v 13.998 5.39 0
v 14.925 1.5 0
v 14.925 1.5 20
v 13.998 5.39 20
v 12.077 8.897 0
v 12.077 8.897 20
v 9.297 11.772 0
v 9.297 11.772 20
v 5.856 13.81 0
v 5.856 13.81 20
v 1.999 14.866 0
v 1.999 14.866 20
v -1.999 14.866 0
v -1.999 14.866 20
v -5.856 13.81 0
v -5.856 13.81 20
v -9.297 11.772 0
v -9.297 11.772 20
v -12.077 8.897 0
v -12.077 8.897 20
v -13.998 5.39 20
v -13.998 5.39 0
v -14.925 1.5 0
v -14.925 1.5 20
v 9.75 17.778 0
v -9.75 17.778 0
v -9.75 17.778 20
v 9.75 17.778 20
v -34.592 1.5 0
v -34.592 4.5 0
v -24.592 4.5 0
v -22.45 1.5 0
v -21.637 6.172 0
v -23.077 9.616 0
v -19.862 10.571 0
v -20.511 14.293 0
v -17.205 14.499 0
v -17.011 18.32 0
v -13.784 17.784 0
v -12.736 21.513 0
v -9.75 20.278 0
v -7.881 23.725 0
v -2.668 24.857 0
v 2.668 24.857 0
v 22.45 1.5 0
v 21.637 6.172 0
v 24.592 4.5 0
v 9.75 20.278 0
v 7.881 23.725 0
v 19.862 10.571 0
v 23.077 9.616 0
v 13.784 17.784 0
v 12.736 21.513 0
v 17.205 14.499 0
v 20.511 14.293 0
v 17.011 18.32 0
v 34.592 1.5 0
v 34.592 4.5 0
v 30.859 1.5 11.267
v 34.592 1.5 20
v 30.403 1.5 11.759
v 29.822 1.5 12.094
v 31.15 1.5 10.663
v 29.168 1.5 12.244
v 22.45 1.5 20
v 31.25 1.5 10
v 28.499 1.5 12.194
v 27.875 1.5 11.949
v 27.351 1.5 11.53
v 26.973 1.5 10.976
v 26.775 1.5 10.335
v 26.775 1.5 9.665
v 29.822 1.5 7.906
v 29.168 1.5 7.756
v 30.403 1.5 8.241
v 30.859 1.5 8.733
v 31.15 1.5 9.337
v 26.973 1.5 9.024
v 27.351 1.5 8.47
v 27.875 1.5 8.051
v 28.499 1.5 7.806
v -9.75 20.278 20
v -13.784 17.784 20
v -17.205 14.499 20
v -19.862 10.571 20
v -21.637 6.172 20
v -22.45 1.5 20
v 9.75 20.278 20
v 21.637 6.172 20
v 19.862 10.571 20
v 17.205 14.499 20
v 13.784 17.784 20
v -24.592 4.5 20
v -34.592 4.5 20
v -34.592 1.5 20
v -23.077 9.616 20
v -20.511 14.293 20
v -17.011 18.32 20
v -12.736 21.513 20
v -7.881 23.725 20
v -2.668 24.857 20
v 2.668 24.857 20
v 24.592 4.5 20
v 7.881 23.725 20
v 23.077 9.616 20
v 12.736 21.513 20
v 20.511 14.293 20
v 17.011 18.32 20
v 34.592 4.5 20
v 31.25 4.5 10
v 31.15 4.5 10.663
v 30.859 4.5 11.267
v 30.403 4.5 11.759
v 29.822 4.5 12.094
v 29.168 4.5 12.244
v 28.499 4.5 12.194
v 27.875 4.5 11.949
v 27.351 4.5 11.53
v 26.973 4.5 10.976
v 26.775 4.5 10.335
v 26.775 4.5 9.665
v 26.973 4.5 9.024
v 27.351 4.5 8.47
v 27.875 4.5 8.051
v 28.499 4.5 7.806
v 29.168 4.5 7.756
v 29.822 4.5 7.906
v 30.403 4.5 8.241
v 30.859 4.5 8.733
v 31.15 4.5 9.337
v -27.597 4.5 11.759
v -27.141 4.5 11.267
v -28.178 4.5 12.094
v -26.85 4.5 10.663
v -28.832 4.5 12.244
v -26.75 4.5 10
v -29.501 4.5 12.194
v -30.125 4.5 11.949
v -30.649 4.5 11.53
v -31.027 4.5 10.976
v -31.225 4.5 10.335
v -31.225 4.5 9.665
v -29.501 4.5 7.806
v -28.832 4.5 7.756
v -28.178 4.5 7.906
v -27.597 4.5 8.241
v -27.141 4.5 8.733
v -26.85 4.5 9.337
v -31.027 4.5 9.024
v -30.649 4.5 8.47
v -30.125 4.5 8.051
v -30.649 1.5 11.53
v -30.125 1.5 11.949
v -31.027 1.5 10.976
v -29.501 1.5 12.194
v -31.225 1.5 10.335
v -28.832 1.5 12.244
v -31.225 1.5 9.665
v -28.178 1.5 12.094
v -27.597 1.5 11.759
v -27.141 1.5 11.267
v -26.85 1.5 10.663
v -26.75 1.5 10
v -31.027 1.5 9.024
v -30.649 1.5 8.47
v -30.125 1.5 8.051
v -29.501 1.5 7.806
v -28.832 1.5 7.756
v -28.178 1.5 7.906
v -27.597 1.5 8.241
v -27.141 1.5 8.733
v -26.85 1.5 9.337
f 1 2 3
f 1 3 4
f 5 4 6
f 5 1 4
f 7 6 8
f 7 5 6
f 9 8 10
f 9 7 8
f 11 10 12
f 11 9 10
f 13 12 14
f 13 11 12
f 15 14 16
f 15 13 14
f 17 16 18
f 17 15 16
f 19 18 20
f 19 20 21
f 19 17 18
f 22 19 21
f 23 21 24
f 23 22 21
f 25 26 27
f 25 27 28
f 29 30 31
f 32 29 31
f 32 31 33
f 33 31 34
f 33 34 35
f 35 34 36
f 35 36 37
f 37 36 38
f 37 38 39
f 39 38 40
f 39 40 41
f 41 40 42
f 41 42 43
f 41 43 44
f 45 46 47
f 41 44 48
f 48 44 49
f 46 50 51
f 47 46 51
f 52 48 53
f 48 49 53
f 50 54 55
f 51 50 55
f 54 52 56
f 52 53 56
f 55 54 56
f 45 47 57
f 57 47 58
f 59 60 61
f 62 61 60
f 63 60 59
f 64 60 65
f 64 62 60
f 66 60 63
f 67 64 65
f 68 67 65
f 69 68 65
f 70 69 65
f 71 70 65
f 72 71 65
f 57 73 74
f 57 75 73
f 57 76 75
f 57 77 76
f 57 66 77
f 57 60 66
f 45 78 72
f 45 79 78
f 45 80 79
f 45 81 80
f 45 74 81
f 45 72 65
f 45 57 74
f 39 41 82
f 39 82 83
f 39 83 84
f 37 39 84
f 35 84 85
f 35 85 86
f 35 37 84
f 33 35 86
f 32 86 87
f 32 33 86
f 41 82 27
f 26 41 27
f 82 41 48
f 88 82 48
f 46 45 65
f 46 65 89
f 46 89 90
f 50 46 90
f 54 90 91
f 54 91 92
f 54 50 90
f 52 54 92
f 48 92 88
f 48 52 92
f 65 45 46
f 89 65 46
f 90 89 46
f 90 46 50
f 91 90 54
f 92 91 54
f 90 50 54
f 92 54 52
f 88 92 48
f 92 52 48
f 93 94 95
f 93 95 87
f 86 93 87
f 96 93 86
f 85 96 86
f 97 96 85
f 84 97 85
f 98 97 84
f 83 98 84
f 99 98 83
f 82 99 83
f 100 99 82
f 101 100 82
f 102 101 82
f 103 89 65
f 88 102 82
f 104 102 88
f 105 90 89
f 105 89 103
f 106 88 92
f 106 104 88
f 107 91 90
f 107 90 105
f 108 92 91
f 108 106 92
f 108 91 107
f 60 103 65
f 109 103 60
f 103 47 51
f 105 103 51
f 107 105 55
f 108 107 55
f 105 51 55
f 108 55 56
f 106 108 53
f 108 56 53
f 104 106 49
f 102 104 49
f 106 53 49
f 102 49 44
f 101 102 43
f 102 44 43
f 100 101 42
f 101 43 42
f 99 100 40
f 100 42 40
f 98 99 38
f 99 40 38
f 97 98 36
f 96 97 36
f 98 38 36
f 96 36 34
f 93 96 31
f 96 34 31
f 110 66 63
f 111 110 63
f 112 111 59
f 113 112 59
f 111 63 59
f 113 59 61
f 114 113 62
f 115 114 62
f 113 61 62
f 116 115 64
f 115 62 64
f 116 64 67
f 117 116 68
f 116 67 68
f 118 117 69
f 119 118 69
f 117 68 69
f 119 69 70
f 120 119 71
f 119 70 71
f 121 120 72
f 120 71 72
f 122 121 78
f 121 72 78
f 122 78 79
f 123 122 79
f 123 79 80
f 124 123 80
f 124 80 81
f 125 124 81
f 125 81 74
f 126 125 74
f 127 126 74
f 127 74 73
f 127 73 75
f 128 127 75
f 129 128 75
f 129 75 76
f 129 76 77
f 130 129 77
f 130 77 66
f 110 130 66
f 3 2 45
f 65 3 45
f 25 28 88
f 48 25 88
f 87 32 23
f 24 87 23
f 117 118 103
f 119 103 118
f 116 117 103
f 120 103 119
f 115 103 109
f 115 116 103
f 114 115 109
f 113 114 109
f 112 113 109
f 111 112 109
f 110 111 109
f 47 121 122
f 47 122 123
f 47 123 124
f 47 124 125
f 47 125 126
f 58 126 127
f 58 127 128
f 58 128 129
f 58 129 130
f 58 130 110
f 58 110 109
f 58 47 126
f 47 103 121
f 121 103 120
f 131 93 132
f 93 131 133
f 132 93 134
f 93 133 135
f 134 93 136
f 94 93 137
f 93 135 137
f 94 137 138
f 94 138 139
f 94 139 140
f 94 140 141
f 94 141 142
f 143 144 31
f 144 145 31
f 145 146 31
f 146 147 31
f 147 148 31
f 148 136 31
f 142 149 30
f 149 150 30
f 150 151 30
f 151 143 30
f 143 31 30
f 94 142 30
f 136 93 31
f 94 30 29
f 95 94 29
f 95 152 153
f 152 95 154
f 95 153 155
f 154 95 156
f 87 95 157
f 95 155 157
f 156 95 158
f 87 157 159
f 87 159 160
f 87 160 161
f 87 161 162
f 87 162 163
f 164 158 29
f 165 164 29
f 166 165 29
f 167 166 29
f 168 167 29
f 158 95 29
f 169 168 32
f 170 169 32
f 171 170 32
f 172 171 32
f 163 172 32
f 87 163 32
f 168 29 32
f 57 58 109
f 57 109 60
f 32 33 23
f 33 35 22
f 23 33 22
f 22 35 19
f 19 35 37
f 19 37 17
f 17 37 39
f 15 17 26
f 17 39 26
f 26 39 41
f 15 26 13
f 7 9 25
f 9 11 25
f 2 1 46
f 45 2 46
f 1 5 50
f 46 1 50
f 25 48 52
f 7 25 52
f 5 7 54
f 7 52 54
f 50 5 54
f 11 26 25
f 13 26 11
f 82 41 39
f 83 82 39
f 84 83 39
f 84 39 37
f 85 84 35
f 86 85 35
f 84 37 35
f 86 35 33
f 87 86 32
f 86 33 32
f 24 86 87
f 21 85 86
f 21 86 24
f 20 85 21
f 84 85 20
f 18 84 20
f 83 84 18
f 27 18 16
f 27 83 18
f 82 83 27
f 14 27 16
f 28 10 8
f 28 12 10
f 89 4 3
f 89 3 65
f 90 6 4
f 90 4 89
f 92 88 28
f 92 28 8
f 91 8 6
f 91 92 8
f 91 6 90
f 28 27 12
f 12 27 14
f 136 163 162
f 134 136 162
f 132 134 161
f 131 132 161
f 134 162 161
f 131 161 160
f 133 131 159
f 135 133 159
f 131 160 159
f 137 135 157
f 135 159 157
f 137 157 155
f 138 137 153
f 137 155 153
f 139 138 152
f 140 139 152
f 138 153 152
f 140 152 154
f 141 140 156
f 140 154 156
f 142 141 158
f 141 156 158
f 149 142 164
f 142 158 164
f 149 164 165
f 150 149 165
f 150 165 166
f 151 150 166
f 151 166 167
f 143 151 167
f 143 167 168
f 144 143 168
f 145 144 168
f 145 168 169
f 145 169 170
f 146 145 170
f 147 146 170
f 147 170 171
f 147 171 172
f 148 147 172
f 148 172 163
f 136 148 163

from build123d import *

# Parameters (mm, degrees)
PAD_DEPTH    = 20
PAD001_DEPTH = 20
SKETCH002_R  = 2.25
POCKET_DEPTH = 25.001


with BuildPart() as body:
    # Sketch → Pad (new body)
    with BuildSketch(Plane.XY):
        with BuildLine():
            ThreePointArc((-9.75, 20.277759), (-18.637601, 12.605151), (-22.449944, 1.5))
            Line((-22.449944, 1.5), (-14.924812, 1.5))
            ThreePointArc((14.924812, 1.5), (0, 15), (-14.924812, 1.5))
            Line((14.924812, 1.5), (22.449944, 1.5))
            ThreePointArc((22.449944, 1.5), (18.637601, 12.605151), (9.75, 20.277759))
            Line((9.75, 17.777759), (9.75, 20.277759))
            Line((-9.75, 17.777759), (9.75, 17.777759))
            Line((-9.75, 20.277759), (-9.75, 17.777759))
        make_face()
    extrude(amount=PAD_DEPTH)


with BuildPart() as body001:
    # Sketch001 → Pad001 (new body)
    with BuildSketch(Plane.XY):
        with BuildLine():
            ThreePointArc((24.591665, 4.5), (0, 25), (-24.591665, 4.5))
            Line((-24.591665, 4.5), (-34.591665, 4.5))
            Line((-34.591665, 4.5), (-34.591665, 1.5))
            Line((-34.591665, 1.5), (-22.449944, 1.5))
            ThreePointArc((-9.75, 20.277759), (-18.637601, 12.605151), (-22.449944, 1.5))
            Line((-9.75, 20.277759), (9.75, 20.277759))
            ThreePointArc((22.449944, 1.5), (18.637601, 12.605151), (9.75, 20.277759))
            Line((34.591665, 1.5), (22.449944, 1.5))
            Line((34.591665, 4.5), (34.591665, 1.5))
            Line((24.591665, 4.5), (34.591665, 4.5))
        make_face()
    extrude(amount=PAD001_DEPTH)

    # Sketch002 → Pocket (cut, through all)
    with BuildSketch(Plane.XZ):
        with Locations((-29, 10)):
            Circle(SKETCH002_R)
        with Locations((29, 10)):
            Circle(SKETCH002_R)
    extrude(amount=-POCKET_DEPTH, mode=Mode.SUBTRACT)


solid = Compound([body.part, body001.part])
